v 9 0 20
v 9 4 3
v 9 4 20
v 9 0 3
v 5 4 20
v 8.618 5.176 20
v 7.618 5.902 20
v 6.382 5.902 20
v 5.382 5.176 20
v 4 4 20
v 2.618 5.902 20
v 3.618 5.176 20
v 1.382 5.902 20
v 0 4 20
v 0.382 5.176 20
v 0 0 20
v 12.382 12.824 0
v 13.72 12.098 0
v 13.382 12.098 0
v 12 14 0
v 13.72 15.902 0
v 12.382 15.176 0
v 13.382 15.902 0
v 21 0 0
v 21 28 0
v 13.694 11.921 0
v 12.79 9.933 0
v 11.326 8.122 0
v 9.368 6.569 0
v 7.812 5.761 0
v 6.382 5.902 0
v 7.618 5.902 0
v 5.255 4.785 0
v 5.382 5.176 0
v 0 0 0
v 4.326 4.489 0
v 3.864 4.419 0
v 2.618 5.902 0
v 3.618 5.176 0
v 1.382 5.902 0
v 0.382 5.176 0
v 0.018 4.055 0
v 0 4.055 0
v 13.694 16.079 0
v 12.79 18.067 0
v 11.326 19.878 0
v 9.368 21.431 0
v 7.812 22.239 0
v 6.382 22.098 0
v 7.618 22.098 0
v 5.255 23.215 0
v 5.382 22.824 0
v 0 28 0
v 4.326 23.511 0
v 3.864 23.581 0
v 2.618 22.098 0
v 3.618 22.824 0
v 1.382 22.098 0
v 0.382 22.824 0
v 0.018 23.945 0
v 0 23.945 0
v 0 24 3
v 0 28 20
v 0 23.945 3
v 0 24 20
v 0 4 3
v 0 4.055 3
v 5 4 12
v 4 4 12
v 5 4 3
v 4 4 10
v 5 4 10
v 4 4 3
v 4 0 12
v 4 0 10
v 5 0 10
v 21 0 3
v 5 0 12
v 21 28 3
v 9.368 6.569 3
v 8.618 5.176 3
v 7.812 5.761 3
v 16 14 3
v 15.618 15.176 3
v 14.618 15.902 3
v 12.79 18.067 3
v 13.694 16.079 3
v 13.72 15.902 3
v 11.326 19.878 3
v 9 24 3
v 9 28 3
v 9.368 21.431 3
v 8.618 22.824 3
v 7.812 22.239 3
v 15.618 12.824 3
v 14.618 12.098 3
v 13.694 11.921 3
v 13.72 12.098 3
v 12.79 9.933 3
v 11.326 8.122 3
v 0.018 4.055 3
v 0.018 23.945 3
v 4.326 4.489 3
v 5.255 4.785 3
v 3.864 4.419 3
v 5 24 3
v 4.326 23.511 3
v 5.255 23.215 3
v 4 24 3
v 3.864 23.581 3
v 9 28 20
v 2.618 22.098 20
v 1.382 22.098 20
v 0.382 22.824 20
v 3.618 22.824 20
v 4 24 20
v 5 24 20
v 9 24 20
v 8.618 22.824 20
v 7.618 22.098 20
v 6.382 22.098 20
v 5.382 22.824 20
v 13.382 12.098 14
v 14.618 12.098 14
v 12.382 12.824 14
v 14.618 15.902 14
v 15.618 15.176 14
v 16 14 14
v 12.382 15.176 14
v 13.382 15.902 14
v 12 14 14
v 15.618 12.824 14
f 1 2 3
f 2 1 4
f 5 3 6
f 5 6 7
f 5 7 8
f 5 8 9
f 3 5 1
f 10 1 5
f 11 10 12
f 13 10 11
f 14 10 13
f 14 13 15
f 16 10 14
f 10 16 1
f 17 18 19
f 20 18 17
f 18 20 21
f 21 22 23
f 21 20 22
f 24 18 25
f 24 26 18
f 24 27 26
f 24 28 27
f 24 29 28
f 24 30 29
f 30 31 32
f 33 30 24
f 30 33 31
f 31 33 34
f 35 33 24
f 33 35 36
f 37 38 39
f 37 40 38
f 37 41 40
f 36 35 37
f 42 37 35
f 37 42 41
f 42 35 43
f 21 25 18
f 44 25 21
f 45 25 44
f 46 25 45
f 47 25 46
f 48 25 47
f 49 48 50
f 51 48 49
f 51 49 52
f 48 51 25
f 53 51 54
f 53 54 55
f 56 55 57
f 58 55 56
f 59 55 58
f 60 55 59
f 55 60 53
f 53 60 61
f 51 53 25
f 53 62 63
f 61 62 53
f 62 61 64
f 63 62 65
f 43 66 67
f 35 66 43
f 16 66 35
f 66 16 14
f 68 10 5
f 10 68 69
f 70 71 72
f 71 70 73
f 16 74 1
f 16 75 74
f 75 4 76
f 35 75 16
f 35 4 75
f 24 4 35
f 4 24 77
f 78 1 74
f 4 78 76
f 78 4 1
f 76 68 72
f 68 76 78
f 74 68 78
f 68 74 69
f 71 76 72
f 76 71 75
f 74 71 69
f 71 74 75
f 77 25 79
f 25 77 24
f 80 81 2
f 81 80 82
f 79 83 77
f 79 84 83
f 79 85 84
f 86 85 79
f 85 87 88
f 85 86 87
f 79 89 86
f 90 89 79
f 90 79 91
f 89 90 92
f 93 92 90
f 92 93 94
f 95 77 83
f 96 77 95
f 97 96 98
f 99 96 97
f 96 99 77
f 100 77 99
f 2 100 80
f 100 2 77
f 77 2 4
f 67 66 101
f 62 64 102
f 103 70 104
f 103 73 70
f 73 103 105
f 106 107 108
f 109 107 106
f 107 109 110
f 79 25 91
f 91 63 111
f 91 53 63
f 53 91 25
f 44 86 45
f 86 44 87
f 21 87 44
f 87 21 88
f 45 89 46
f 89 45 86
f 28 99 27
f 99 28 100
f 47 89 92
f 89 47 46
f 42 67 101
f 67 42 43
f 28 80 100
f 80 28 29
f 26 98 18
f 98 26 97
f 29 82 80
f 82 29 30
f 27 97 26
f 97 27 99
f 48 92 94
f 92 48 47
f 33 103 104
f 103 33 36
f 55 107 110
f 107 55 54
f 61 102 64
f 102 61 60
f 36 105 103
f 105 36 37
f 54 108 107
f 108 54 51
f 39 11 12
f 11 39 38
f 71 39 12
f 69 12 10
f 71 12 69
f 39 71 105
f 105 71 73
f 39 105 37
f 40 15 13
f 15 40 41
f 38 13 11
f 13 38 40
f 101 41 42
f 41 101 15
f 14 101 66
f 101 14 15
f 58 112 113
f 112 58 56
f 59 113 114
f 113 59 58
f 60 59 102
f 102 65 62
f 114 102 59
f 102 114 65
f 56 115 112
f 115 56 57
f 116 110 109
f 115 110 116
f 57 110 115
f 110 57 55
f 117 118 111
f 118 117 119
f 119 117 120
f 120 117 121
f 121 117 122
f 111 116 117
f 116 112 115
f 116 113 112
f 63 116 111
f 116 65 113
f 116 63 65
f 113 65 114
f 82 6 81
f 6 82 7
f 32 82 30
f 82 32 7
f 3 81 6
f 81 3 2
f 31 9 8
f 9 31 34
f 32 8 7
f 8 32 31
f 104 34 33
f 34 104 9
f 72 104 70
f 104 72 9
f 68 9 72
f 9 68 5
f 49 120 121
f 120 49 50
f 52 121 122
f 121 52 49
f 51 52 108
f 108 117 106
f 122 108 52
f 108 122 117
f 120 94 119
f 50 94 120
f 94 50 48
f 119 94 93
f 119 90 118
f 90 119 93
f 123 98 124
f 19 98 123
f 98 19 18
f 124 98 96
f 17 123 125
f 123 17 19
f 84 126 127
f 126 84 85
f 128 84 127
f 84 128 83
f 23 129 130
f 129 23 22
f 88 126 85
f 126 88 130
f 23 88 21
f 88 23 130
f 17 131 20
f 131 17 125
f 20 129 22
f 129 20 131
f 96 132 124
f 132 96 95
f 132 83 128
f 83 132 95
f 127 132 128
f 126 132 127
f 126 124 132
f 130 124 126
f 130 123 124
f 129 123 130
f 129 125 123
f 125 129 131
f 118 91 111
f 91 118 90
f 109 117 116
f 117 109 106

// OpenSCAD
/* [Dimensions] */
// Measure of a H05-Cable between 7 to 9mm

// Cable Width
CWIDTH = 10;//[6:12]
// Gap of wall
GAP = 9; //[5:15]
// height of top/bottom
HEIGHT = 20; //[10:50]

// Gap 1
difference(){
cube([GAP,4,HEIGHT]);
translate([04,0,HEIGHT/2])cube([1,2*CWIDTH+8,2]);
}

// Connector
difference(){
translate([0,-0,0])cube([12+GAP,2*CWIDTH+8,3]);
translate([0,CWIDTH+4,0])scale([1.4,1,1])cylinder(h= 50, r=CWIDTH);};

// Guiding Rails
translate([2,4,0])cylinder($fn = 10,h= HEIGHT, r=(CWIDTH/5));
translate([2,2*CWIDTH+4,0])cylinder($fn = 10,h= HEIGHT, r=(CWIDTH/5));
translate([GAP-2,4,0])cylinder($fn = 10,h= HEIGHT, r=(CWIDTH/5));
translate([GAP-2,2*CWIDTH+4,0])cylinder($fn = 10,h= HEIGHT, r=(CWIDTH/5));

translate([1.4*CWIDTH,CWIDTH+4,0])cylinder($fn = 10,h= (HEIGHT/2+4), r=(CWIDTH/5));

// Gap 2
translate([0,2*CWIDTH+4,0])cube([GAP,4,HEIGHT]);
